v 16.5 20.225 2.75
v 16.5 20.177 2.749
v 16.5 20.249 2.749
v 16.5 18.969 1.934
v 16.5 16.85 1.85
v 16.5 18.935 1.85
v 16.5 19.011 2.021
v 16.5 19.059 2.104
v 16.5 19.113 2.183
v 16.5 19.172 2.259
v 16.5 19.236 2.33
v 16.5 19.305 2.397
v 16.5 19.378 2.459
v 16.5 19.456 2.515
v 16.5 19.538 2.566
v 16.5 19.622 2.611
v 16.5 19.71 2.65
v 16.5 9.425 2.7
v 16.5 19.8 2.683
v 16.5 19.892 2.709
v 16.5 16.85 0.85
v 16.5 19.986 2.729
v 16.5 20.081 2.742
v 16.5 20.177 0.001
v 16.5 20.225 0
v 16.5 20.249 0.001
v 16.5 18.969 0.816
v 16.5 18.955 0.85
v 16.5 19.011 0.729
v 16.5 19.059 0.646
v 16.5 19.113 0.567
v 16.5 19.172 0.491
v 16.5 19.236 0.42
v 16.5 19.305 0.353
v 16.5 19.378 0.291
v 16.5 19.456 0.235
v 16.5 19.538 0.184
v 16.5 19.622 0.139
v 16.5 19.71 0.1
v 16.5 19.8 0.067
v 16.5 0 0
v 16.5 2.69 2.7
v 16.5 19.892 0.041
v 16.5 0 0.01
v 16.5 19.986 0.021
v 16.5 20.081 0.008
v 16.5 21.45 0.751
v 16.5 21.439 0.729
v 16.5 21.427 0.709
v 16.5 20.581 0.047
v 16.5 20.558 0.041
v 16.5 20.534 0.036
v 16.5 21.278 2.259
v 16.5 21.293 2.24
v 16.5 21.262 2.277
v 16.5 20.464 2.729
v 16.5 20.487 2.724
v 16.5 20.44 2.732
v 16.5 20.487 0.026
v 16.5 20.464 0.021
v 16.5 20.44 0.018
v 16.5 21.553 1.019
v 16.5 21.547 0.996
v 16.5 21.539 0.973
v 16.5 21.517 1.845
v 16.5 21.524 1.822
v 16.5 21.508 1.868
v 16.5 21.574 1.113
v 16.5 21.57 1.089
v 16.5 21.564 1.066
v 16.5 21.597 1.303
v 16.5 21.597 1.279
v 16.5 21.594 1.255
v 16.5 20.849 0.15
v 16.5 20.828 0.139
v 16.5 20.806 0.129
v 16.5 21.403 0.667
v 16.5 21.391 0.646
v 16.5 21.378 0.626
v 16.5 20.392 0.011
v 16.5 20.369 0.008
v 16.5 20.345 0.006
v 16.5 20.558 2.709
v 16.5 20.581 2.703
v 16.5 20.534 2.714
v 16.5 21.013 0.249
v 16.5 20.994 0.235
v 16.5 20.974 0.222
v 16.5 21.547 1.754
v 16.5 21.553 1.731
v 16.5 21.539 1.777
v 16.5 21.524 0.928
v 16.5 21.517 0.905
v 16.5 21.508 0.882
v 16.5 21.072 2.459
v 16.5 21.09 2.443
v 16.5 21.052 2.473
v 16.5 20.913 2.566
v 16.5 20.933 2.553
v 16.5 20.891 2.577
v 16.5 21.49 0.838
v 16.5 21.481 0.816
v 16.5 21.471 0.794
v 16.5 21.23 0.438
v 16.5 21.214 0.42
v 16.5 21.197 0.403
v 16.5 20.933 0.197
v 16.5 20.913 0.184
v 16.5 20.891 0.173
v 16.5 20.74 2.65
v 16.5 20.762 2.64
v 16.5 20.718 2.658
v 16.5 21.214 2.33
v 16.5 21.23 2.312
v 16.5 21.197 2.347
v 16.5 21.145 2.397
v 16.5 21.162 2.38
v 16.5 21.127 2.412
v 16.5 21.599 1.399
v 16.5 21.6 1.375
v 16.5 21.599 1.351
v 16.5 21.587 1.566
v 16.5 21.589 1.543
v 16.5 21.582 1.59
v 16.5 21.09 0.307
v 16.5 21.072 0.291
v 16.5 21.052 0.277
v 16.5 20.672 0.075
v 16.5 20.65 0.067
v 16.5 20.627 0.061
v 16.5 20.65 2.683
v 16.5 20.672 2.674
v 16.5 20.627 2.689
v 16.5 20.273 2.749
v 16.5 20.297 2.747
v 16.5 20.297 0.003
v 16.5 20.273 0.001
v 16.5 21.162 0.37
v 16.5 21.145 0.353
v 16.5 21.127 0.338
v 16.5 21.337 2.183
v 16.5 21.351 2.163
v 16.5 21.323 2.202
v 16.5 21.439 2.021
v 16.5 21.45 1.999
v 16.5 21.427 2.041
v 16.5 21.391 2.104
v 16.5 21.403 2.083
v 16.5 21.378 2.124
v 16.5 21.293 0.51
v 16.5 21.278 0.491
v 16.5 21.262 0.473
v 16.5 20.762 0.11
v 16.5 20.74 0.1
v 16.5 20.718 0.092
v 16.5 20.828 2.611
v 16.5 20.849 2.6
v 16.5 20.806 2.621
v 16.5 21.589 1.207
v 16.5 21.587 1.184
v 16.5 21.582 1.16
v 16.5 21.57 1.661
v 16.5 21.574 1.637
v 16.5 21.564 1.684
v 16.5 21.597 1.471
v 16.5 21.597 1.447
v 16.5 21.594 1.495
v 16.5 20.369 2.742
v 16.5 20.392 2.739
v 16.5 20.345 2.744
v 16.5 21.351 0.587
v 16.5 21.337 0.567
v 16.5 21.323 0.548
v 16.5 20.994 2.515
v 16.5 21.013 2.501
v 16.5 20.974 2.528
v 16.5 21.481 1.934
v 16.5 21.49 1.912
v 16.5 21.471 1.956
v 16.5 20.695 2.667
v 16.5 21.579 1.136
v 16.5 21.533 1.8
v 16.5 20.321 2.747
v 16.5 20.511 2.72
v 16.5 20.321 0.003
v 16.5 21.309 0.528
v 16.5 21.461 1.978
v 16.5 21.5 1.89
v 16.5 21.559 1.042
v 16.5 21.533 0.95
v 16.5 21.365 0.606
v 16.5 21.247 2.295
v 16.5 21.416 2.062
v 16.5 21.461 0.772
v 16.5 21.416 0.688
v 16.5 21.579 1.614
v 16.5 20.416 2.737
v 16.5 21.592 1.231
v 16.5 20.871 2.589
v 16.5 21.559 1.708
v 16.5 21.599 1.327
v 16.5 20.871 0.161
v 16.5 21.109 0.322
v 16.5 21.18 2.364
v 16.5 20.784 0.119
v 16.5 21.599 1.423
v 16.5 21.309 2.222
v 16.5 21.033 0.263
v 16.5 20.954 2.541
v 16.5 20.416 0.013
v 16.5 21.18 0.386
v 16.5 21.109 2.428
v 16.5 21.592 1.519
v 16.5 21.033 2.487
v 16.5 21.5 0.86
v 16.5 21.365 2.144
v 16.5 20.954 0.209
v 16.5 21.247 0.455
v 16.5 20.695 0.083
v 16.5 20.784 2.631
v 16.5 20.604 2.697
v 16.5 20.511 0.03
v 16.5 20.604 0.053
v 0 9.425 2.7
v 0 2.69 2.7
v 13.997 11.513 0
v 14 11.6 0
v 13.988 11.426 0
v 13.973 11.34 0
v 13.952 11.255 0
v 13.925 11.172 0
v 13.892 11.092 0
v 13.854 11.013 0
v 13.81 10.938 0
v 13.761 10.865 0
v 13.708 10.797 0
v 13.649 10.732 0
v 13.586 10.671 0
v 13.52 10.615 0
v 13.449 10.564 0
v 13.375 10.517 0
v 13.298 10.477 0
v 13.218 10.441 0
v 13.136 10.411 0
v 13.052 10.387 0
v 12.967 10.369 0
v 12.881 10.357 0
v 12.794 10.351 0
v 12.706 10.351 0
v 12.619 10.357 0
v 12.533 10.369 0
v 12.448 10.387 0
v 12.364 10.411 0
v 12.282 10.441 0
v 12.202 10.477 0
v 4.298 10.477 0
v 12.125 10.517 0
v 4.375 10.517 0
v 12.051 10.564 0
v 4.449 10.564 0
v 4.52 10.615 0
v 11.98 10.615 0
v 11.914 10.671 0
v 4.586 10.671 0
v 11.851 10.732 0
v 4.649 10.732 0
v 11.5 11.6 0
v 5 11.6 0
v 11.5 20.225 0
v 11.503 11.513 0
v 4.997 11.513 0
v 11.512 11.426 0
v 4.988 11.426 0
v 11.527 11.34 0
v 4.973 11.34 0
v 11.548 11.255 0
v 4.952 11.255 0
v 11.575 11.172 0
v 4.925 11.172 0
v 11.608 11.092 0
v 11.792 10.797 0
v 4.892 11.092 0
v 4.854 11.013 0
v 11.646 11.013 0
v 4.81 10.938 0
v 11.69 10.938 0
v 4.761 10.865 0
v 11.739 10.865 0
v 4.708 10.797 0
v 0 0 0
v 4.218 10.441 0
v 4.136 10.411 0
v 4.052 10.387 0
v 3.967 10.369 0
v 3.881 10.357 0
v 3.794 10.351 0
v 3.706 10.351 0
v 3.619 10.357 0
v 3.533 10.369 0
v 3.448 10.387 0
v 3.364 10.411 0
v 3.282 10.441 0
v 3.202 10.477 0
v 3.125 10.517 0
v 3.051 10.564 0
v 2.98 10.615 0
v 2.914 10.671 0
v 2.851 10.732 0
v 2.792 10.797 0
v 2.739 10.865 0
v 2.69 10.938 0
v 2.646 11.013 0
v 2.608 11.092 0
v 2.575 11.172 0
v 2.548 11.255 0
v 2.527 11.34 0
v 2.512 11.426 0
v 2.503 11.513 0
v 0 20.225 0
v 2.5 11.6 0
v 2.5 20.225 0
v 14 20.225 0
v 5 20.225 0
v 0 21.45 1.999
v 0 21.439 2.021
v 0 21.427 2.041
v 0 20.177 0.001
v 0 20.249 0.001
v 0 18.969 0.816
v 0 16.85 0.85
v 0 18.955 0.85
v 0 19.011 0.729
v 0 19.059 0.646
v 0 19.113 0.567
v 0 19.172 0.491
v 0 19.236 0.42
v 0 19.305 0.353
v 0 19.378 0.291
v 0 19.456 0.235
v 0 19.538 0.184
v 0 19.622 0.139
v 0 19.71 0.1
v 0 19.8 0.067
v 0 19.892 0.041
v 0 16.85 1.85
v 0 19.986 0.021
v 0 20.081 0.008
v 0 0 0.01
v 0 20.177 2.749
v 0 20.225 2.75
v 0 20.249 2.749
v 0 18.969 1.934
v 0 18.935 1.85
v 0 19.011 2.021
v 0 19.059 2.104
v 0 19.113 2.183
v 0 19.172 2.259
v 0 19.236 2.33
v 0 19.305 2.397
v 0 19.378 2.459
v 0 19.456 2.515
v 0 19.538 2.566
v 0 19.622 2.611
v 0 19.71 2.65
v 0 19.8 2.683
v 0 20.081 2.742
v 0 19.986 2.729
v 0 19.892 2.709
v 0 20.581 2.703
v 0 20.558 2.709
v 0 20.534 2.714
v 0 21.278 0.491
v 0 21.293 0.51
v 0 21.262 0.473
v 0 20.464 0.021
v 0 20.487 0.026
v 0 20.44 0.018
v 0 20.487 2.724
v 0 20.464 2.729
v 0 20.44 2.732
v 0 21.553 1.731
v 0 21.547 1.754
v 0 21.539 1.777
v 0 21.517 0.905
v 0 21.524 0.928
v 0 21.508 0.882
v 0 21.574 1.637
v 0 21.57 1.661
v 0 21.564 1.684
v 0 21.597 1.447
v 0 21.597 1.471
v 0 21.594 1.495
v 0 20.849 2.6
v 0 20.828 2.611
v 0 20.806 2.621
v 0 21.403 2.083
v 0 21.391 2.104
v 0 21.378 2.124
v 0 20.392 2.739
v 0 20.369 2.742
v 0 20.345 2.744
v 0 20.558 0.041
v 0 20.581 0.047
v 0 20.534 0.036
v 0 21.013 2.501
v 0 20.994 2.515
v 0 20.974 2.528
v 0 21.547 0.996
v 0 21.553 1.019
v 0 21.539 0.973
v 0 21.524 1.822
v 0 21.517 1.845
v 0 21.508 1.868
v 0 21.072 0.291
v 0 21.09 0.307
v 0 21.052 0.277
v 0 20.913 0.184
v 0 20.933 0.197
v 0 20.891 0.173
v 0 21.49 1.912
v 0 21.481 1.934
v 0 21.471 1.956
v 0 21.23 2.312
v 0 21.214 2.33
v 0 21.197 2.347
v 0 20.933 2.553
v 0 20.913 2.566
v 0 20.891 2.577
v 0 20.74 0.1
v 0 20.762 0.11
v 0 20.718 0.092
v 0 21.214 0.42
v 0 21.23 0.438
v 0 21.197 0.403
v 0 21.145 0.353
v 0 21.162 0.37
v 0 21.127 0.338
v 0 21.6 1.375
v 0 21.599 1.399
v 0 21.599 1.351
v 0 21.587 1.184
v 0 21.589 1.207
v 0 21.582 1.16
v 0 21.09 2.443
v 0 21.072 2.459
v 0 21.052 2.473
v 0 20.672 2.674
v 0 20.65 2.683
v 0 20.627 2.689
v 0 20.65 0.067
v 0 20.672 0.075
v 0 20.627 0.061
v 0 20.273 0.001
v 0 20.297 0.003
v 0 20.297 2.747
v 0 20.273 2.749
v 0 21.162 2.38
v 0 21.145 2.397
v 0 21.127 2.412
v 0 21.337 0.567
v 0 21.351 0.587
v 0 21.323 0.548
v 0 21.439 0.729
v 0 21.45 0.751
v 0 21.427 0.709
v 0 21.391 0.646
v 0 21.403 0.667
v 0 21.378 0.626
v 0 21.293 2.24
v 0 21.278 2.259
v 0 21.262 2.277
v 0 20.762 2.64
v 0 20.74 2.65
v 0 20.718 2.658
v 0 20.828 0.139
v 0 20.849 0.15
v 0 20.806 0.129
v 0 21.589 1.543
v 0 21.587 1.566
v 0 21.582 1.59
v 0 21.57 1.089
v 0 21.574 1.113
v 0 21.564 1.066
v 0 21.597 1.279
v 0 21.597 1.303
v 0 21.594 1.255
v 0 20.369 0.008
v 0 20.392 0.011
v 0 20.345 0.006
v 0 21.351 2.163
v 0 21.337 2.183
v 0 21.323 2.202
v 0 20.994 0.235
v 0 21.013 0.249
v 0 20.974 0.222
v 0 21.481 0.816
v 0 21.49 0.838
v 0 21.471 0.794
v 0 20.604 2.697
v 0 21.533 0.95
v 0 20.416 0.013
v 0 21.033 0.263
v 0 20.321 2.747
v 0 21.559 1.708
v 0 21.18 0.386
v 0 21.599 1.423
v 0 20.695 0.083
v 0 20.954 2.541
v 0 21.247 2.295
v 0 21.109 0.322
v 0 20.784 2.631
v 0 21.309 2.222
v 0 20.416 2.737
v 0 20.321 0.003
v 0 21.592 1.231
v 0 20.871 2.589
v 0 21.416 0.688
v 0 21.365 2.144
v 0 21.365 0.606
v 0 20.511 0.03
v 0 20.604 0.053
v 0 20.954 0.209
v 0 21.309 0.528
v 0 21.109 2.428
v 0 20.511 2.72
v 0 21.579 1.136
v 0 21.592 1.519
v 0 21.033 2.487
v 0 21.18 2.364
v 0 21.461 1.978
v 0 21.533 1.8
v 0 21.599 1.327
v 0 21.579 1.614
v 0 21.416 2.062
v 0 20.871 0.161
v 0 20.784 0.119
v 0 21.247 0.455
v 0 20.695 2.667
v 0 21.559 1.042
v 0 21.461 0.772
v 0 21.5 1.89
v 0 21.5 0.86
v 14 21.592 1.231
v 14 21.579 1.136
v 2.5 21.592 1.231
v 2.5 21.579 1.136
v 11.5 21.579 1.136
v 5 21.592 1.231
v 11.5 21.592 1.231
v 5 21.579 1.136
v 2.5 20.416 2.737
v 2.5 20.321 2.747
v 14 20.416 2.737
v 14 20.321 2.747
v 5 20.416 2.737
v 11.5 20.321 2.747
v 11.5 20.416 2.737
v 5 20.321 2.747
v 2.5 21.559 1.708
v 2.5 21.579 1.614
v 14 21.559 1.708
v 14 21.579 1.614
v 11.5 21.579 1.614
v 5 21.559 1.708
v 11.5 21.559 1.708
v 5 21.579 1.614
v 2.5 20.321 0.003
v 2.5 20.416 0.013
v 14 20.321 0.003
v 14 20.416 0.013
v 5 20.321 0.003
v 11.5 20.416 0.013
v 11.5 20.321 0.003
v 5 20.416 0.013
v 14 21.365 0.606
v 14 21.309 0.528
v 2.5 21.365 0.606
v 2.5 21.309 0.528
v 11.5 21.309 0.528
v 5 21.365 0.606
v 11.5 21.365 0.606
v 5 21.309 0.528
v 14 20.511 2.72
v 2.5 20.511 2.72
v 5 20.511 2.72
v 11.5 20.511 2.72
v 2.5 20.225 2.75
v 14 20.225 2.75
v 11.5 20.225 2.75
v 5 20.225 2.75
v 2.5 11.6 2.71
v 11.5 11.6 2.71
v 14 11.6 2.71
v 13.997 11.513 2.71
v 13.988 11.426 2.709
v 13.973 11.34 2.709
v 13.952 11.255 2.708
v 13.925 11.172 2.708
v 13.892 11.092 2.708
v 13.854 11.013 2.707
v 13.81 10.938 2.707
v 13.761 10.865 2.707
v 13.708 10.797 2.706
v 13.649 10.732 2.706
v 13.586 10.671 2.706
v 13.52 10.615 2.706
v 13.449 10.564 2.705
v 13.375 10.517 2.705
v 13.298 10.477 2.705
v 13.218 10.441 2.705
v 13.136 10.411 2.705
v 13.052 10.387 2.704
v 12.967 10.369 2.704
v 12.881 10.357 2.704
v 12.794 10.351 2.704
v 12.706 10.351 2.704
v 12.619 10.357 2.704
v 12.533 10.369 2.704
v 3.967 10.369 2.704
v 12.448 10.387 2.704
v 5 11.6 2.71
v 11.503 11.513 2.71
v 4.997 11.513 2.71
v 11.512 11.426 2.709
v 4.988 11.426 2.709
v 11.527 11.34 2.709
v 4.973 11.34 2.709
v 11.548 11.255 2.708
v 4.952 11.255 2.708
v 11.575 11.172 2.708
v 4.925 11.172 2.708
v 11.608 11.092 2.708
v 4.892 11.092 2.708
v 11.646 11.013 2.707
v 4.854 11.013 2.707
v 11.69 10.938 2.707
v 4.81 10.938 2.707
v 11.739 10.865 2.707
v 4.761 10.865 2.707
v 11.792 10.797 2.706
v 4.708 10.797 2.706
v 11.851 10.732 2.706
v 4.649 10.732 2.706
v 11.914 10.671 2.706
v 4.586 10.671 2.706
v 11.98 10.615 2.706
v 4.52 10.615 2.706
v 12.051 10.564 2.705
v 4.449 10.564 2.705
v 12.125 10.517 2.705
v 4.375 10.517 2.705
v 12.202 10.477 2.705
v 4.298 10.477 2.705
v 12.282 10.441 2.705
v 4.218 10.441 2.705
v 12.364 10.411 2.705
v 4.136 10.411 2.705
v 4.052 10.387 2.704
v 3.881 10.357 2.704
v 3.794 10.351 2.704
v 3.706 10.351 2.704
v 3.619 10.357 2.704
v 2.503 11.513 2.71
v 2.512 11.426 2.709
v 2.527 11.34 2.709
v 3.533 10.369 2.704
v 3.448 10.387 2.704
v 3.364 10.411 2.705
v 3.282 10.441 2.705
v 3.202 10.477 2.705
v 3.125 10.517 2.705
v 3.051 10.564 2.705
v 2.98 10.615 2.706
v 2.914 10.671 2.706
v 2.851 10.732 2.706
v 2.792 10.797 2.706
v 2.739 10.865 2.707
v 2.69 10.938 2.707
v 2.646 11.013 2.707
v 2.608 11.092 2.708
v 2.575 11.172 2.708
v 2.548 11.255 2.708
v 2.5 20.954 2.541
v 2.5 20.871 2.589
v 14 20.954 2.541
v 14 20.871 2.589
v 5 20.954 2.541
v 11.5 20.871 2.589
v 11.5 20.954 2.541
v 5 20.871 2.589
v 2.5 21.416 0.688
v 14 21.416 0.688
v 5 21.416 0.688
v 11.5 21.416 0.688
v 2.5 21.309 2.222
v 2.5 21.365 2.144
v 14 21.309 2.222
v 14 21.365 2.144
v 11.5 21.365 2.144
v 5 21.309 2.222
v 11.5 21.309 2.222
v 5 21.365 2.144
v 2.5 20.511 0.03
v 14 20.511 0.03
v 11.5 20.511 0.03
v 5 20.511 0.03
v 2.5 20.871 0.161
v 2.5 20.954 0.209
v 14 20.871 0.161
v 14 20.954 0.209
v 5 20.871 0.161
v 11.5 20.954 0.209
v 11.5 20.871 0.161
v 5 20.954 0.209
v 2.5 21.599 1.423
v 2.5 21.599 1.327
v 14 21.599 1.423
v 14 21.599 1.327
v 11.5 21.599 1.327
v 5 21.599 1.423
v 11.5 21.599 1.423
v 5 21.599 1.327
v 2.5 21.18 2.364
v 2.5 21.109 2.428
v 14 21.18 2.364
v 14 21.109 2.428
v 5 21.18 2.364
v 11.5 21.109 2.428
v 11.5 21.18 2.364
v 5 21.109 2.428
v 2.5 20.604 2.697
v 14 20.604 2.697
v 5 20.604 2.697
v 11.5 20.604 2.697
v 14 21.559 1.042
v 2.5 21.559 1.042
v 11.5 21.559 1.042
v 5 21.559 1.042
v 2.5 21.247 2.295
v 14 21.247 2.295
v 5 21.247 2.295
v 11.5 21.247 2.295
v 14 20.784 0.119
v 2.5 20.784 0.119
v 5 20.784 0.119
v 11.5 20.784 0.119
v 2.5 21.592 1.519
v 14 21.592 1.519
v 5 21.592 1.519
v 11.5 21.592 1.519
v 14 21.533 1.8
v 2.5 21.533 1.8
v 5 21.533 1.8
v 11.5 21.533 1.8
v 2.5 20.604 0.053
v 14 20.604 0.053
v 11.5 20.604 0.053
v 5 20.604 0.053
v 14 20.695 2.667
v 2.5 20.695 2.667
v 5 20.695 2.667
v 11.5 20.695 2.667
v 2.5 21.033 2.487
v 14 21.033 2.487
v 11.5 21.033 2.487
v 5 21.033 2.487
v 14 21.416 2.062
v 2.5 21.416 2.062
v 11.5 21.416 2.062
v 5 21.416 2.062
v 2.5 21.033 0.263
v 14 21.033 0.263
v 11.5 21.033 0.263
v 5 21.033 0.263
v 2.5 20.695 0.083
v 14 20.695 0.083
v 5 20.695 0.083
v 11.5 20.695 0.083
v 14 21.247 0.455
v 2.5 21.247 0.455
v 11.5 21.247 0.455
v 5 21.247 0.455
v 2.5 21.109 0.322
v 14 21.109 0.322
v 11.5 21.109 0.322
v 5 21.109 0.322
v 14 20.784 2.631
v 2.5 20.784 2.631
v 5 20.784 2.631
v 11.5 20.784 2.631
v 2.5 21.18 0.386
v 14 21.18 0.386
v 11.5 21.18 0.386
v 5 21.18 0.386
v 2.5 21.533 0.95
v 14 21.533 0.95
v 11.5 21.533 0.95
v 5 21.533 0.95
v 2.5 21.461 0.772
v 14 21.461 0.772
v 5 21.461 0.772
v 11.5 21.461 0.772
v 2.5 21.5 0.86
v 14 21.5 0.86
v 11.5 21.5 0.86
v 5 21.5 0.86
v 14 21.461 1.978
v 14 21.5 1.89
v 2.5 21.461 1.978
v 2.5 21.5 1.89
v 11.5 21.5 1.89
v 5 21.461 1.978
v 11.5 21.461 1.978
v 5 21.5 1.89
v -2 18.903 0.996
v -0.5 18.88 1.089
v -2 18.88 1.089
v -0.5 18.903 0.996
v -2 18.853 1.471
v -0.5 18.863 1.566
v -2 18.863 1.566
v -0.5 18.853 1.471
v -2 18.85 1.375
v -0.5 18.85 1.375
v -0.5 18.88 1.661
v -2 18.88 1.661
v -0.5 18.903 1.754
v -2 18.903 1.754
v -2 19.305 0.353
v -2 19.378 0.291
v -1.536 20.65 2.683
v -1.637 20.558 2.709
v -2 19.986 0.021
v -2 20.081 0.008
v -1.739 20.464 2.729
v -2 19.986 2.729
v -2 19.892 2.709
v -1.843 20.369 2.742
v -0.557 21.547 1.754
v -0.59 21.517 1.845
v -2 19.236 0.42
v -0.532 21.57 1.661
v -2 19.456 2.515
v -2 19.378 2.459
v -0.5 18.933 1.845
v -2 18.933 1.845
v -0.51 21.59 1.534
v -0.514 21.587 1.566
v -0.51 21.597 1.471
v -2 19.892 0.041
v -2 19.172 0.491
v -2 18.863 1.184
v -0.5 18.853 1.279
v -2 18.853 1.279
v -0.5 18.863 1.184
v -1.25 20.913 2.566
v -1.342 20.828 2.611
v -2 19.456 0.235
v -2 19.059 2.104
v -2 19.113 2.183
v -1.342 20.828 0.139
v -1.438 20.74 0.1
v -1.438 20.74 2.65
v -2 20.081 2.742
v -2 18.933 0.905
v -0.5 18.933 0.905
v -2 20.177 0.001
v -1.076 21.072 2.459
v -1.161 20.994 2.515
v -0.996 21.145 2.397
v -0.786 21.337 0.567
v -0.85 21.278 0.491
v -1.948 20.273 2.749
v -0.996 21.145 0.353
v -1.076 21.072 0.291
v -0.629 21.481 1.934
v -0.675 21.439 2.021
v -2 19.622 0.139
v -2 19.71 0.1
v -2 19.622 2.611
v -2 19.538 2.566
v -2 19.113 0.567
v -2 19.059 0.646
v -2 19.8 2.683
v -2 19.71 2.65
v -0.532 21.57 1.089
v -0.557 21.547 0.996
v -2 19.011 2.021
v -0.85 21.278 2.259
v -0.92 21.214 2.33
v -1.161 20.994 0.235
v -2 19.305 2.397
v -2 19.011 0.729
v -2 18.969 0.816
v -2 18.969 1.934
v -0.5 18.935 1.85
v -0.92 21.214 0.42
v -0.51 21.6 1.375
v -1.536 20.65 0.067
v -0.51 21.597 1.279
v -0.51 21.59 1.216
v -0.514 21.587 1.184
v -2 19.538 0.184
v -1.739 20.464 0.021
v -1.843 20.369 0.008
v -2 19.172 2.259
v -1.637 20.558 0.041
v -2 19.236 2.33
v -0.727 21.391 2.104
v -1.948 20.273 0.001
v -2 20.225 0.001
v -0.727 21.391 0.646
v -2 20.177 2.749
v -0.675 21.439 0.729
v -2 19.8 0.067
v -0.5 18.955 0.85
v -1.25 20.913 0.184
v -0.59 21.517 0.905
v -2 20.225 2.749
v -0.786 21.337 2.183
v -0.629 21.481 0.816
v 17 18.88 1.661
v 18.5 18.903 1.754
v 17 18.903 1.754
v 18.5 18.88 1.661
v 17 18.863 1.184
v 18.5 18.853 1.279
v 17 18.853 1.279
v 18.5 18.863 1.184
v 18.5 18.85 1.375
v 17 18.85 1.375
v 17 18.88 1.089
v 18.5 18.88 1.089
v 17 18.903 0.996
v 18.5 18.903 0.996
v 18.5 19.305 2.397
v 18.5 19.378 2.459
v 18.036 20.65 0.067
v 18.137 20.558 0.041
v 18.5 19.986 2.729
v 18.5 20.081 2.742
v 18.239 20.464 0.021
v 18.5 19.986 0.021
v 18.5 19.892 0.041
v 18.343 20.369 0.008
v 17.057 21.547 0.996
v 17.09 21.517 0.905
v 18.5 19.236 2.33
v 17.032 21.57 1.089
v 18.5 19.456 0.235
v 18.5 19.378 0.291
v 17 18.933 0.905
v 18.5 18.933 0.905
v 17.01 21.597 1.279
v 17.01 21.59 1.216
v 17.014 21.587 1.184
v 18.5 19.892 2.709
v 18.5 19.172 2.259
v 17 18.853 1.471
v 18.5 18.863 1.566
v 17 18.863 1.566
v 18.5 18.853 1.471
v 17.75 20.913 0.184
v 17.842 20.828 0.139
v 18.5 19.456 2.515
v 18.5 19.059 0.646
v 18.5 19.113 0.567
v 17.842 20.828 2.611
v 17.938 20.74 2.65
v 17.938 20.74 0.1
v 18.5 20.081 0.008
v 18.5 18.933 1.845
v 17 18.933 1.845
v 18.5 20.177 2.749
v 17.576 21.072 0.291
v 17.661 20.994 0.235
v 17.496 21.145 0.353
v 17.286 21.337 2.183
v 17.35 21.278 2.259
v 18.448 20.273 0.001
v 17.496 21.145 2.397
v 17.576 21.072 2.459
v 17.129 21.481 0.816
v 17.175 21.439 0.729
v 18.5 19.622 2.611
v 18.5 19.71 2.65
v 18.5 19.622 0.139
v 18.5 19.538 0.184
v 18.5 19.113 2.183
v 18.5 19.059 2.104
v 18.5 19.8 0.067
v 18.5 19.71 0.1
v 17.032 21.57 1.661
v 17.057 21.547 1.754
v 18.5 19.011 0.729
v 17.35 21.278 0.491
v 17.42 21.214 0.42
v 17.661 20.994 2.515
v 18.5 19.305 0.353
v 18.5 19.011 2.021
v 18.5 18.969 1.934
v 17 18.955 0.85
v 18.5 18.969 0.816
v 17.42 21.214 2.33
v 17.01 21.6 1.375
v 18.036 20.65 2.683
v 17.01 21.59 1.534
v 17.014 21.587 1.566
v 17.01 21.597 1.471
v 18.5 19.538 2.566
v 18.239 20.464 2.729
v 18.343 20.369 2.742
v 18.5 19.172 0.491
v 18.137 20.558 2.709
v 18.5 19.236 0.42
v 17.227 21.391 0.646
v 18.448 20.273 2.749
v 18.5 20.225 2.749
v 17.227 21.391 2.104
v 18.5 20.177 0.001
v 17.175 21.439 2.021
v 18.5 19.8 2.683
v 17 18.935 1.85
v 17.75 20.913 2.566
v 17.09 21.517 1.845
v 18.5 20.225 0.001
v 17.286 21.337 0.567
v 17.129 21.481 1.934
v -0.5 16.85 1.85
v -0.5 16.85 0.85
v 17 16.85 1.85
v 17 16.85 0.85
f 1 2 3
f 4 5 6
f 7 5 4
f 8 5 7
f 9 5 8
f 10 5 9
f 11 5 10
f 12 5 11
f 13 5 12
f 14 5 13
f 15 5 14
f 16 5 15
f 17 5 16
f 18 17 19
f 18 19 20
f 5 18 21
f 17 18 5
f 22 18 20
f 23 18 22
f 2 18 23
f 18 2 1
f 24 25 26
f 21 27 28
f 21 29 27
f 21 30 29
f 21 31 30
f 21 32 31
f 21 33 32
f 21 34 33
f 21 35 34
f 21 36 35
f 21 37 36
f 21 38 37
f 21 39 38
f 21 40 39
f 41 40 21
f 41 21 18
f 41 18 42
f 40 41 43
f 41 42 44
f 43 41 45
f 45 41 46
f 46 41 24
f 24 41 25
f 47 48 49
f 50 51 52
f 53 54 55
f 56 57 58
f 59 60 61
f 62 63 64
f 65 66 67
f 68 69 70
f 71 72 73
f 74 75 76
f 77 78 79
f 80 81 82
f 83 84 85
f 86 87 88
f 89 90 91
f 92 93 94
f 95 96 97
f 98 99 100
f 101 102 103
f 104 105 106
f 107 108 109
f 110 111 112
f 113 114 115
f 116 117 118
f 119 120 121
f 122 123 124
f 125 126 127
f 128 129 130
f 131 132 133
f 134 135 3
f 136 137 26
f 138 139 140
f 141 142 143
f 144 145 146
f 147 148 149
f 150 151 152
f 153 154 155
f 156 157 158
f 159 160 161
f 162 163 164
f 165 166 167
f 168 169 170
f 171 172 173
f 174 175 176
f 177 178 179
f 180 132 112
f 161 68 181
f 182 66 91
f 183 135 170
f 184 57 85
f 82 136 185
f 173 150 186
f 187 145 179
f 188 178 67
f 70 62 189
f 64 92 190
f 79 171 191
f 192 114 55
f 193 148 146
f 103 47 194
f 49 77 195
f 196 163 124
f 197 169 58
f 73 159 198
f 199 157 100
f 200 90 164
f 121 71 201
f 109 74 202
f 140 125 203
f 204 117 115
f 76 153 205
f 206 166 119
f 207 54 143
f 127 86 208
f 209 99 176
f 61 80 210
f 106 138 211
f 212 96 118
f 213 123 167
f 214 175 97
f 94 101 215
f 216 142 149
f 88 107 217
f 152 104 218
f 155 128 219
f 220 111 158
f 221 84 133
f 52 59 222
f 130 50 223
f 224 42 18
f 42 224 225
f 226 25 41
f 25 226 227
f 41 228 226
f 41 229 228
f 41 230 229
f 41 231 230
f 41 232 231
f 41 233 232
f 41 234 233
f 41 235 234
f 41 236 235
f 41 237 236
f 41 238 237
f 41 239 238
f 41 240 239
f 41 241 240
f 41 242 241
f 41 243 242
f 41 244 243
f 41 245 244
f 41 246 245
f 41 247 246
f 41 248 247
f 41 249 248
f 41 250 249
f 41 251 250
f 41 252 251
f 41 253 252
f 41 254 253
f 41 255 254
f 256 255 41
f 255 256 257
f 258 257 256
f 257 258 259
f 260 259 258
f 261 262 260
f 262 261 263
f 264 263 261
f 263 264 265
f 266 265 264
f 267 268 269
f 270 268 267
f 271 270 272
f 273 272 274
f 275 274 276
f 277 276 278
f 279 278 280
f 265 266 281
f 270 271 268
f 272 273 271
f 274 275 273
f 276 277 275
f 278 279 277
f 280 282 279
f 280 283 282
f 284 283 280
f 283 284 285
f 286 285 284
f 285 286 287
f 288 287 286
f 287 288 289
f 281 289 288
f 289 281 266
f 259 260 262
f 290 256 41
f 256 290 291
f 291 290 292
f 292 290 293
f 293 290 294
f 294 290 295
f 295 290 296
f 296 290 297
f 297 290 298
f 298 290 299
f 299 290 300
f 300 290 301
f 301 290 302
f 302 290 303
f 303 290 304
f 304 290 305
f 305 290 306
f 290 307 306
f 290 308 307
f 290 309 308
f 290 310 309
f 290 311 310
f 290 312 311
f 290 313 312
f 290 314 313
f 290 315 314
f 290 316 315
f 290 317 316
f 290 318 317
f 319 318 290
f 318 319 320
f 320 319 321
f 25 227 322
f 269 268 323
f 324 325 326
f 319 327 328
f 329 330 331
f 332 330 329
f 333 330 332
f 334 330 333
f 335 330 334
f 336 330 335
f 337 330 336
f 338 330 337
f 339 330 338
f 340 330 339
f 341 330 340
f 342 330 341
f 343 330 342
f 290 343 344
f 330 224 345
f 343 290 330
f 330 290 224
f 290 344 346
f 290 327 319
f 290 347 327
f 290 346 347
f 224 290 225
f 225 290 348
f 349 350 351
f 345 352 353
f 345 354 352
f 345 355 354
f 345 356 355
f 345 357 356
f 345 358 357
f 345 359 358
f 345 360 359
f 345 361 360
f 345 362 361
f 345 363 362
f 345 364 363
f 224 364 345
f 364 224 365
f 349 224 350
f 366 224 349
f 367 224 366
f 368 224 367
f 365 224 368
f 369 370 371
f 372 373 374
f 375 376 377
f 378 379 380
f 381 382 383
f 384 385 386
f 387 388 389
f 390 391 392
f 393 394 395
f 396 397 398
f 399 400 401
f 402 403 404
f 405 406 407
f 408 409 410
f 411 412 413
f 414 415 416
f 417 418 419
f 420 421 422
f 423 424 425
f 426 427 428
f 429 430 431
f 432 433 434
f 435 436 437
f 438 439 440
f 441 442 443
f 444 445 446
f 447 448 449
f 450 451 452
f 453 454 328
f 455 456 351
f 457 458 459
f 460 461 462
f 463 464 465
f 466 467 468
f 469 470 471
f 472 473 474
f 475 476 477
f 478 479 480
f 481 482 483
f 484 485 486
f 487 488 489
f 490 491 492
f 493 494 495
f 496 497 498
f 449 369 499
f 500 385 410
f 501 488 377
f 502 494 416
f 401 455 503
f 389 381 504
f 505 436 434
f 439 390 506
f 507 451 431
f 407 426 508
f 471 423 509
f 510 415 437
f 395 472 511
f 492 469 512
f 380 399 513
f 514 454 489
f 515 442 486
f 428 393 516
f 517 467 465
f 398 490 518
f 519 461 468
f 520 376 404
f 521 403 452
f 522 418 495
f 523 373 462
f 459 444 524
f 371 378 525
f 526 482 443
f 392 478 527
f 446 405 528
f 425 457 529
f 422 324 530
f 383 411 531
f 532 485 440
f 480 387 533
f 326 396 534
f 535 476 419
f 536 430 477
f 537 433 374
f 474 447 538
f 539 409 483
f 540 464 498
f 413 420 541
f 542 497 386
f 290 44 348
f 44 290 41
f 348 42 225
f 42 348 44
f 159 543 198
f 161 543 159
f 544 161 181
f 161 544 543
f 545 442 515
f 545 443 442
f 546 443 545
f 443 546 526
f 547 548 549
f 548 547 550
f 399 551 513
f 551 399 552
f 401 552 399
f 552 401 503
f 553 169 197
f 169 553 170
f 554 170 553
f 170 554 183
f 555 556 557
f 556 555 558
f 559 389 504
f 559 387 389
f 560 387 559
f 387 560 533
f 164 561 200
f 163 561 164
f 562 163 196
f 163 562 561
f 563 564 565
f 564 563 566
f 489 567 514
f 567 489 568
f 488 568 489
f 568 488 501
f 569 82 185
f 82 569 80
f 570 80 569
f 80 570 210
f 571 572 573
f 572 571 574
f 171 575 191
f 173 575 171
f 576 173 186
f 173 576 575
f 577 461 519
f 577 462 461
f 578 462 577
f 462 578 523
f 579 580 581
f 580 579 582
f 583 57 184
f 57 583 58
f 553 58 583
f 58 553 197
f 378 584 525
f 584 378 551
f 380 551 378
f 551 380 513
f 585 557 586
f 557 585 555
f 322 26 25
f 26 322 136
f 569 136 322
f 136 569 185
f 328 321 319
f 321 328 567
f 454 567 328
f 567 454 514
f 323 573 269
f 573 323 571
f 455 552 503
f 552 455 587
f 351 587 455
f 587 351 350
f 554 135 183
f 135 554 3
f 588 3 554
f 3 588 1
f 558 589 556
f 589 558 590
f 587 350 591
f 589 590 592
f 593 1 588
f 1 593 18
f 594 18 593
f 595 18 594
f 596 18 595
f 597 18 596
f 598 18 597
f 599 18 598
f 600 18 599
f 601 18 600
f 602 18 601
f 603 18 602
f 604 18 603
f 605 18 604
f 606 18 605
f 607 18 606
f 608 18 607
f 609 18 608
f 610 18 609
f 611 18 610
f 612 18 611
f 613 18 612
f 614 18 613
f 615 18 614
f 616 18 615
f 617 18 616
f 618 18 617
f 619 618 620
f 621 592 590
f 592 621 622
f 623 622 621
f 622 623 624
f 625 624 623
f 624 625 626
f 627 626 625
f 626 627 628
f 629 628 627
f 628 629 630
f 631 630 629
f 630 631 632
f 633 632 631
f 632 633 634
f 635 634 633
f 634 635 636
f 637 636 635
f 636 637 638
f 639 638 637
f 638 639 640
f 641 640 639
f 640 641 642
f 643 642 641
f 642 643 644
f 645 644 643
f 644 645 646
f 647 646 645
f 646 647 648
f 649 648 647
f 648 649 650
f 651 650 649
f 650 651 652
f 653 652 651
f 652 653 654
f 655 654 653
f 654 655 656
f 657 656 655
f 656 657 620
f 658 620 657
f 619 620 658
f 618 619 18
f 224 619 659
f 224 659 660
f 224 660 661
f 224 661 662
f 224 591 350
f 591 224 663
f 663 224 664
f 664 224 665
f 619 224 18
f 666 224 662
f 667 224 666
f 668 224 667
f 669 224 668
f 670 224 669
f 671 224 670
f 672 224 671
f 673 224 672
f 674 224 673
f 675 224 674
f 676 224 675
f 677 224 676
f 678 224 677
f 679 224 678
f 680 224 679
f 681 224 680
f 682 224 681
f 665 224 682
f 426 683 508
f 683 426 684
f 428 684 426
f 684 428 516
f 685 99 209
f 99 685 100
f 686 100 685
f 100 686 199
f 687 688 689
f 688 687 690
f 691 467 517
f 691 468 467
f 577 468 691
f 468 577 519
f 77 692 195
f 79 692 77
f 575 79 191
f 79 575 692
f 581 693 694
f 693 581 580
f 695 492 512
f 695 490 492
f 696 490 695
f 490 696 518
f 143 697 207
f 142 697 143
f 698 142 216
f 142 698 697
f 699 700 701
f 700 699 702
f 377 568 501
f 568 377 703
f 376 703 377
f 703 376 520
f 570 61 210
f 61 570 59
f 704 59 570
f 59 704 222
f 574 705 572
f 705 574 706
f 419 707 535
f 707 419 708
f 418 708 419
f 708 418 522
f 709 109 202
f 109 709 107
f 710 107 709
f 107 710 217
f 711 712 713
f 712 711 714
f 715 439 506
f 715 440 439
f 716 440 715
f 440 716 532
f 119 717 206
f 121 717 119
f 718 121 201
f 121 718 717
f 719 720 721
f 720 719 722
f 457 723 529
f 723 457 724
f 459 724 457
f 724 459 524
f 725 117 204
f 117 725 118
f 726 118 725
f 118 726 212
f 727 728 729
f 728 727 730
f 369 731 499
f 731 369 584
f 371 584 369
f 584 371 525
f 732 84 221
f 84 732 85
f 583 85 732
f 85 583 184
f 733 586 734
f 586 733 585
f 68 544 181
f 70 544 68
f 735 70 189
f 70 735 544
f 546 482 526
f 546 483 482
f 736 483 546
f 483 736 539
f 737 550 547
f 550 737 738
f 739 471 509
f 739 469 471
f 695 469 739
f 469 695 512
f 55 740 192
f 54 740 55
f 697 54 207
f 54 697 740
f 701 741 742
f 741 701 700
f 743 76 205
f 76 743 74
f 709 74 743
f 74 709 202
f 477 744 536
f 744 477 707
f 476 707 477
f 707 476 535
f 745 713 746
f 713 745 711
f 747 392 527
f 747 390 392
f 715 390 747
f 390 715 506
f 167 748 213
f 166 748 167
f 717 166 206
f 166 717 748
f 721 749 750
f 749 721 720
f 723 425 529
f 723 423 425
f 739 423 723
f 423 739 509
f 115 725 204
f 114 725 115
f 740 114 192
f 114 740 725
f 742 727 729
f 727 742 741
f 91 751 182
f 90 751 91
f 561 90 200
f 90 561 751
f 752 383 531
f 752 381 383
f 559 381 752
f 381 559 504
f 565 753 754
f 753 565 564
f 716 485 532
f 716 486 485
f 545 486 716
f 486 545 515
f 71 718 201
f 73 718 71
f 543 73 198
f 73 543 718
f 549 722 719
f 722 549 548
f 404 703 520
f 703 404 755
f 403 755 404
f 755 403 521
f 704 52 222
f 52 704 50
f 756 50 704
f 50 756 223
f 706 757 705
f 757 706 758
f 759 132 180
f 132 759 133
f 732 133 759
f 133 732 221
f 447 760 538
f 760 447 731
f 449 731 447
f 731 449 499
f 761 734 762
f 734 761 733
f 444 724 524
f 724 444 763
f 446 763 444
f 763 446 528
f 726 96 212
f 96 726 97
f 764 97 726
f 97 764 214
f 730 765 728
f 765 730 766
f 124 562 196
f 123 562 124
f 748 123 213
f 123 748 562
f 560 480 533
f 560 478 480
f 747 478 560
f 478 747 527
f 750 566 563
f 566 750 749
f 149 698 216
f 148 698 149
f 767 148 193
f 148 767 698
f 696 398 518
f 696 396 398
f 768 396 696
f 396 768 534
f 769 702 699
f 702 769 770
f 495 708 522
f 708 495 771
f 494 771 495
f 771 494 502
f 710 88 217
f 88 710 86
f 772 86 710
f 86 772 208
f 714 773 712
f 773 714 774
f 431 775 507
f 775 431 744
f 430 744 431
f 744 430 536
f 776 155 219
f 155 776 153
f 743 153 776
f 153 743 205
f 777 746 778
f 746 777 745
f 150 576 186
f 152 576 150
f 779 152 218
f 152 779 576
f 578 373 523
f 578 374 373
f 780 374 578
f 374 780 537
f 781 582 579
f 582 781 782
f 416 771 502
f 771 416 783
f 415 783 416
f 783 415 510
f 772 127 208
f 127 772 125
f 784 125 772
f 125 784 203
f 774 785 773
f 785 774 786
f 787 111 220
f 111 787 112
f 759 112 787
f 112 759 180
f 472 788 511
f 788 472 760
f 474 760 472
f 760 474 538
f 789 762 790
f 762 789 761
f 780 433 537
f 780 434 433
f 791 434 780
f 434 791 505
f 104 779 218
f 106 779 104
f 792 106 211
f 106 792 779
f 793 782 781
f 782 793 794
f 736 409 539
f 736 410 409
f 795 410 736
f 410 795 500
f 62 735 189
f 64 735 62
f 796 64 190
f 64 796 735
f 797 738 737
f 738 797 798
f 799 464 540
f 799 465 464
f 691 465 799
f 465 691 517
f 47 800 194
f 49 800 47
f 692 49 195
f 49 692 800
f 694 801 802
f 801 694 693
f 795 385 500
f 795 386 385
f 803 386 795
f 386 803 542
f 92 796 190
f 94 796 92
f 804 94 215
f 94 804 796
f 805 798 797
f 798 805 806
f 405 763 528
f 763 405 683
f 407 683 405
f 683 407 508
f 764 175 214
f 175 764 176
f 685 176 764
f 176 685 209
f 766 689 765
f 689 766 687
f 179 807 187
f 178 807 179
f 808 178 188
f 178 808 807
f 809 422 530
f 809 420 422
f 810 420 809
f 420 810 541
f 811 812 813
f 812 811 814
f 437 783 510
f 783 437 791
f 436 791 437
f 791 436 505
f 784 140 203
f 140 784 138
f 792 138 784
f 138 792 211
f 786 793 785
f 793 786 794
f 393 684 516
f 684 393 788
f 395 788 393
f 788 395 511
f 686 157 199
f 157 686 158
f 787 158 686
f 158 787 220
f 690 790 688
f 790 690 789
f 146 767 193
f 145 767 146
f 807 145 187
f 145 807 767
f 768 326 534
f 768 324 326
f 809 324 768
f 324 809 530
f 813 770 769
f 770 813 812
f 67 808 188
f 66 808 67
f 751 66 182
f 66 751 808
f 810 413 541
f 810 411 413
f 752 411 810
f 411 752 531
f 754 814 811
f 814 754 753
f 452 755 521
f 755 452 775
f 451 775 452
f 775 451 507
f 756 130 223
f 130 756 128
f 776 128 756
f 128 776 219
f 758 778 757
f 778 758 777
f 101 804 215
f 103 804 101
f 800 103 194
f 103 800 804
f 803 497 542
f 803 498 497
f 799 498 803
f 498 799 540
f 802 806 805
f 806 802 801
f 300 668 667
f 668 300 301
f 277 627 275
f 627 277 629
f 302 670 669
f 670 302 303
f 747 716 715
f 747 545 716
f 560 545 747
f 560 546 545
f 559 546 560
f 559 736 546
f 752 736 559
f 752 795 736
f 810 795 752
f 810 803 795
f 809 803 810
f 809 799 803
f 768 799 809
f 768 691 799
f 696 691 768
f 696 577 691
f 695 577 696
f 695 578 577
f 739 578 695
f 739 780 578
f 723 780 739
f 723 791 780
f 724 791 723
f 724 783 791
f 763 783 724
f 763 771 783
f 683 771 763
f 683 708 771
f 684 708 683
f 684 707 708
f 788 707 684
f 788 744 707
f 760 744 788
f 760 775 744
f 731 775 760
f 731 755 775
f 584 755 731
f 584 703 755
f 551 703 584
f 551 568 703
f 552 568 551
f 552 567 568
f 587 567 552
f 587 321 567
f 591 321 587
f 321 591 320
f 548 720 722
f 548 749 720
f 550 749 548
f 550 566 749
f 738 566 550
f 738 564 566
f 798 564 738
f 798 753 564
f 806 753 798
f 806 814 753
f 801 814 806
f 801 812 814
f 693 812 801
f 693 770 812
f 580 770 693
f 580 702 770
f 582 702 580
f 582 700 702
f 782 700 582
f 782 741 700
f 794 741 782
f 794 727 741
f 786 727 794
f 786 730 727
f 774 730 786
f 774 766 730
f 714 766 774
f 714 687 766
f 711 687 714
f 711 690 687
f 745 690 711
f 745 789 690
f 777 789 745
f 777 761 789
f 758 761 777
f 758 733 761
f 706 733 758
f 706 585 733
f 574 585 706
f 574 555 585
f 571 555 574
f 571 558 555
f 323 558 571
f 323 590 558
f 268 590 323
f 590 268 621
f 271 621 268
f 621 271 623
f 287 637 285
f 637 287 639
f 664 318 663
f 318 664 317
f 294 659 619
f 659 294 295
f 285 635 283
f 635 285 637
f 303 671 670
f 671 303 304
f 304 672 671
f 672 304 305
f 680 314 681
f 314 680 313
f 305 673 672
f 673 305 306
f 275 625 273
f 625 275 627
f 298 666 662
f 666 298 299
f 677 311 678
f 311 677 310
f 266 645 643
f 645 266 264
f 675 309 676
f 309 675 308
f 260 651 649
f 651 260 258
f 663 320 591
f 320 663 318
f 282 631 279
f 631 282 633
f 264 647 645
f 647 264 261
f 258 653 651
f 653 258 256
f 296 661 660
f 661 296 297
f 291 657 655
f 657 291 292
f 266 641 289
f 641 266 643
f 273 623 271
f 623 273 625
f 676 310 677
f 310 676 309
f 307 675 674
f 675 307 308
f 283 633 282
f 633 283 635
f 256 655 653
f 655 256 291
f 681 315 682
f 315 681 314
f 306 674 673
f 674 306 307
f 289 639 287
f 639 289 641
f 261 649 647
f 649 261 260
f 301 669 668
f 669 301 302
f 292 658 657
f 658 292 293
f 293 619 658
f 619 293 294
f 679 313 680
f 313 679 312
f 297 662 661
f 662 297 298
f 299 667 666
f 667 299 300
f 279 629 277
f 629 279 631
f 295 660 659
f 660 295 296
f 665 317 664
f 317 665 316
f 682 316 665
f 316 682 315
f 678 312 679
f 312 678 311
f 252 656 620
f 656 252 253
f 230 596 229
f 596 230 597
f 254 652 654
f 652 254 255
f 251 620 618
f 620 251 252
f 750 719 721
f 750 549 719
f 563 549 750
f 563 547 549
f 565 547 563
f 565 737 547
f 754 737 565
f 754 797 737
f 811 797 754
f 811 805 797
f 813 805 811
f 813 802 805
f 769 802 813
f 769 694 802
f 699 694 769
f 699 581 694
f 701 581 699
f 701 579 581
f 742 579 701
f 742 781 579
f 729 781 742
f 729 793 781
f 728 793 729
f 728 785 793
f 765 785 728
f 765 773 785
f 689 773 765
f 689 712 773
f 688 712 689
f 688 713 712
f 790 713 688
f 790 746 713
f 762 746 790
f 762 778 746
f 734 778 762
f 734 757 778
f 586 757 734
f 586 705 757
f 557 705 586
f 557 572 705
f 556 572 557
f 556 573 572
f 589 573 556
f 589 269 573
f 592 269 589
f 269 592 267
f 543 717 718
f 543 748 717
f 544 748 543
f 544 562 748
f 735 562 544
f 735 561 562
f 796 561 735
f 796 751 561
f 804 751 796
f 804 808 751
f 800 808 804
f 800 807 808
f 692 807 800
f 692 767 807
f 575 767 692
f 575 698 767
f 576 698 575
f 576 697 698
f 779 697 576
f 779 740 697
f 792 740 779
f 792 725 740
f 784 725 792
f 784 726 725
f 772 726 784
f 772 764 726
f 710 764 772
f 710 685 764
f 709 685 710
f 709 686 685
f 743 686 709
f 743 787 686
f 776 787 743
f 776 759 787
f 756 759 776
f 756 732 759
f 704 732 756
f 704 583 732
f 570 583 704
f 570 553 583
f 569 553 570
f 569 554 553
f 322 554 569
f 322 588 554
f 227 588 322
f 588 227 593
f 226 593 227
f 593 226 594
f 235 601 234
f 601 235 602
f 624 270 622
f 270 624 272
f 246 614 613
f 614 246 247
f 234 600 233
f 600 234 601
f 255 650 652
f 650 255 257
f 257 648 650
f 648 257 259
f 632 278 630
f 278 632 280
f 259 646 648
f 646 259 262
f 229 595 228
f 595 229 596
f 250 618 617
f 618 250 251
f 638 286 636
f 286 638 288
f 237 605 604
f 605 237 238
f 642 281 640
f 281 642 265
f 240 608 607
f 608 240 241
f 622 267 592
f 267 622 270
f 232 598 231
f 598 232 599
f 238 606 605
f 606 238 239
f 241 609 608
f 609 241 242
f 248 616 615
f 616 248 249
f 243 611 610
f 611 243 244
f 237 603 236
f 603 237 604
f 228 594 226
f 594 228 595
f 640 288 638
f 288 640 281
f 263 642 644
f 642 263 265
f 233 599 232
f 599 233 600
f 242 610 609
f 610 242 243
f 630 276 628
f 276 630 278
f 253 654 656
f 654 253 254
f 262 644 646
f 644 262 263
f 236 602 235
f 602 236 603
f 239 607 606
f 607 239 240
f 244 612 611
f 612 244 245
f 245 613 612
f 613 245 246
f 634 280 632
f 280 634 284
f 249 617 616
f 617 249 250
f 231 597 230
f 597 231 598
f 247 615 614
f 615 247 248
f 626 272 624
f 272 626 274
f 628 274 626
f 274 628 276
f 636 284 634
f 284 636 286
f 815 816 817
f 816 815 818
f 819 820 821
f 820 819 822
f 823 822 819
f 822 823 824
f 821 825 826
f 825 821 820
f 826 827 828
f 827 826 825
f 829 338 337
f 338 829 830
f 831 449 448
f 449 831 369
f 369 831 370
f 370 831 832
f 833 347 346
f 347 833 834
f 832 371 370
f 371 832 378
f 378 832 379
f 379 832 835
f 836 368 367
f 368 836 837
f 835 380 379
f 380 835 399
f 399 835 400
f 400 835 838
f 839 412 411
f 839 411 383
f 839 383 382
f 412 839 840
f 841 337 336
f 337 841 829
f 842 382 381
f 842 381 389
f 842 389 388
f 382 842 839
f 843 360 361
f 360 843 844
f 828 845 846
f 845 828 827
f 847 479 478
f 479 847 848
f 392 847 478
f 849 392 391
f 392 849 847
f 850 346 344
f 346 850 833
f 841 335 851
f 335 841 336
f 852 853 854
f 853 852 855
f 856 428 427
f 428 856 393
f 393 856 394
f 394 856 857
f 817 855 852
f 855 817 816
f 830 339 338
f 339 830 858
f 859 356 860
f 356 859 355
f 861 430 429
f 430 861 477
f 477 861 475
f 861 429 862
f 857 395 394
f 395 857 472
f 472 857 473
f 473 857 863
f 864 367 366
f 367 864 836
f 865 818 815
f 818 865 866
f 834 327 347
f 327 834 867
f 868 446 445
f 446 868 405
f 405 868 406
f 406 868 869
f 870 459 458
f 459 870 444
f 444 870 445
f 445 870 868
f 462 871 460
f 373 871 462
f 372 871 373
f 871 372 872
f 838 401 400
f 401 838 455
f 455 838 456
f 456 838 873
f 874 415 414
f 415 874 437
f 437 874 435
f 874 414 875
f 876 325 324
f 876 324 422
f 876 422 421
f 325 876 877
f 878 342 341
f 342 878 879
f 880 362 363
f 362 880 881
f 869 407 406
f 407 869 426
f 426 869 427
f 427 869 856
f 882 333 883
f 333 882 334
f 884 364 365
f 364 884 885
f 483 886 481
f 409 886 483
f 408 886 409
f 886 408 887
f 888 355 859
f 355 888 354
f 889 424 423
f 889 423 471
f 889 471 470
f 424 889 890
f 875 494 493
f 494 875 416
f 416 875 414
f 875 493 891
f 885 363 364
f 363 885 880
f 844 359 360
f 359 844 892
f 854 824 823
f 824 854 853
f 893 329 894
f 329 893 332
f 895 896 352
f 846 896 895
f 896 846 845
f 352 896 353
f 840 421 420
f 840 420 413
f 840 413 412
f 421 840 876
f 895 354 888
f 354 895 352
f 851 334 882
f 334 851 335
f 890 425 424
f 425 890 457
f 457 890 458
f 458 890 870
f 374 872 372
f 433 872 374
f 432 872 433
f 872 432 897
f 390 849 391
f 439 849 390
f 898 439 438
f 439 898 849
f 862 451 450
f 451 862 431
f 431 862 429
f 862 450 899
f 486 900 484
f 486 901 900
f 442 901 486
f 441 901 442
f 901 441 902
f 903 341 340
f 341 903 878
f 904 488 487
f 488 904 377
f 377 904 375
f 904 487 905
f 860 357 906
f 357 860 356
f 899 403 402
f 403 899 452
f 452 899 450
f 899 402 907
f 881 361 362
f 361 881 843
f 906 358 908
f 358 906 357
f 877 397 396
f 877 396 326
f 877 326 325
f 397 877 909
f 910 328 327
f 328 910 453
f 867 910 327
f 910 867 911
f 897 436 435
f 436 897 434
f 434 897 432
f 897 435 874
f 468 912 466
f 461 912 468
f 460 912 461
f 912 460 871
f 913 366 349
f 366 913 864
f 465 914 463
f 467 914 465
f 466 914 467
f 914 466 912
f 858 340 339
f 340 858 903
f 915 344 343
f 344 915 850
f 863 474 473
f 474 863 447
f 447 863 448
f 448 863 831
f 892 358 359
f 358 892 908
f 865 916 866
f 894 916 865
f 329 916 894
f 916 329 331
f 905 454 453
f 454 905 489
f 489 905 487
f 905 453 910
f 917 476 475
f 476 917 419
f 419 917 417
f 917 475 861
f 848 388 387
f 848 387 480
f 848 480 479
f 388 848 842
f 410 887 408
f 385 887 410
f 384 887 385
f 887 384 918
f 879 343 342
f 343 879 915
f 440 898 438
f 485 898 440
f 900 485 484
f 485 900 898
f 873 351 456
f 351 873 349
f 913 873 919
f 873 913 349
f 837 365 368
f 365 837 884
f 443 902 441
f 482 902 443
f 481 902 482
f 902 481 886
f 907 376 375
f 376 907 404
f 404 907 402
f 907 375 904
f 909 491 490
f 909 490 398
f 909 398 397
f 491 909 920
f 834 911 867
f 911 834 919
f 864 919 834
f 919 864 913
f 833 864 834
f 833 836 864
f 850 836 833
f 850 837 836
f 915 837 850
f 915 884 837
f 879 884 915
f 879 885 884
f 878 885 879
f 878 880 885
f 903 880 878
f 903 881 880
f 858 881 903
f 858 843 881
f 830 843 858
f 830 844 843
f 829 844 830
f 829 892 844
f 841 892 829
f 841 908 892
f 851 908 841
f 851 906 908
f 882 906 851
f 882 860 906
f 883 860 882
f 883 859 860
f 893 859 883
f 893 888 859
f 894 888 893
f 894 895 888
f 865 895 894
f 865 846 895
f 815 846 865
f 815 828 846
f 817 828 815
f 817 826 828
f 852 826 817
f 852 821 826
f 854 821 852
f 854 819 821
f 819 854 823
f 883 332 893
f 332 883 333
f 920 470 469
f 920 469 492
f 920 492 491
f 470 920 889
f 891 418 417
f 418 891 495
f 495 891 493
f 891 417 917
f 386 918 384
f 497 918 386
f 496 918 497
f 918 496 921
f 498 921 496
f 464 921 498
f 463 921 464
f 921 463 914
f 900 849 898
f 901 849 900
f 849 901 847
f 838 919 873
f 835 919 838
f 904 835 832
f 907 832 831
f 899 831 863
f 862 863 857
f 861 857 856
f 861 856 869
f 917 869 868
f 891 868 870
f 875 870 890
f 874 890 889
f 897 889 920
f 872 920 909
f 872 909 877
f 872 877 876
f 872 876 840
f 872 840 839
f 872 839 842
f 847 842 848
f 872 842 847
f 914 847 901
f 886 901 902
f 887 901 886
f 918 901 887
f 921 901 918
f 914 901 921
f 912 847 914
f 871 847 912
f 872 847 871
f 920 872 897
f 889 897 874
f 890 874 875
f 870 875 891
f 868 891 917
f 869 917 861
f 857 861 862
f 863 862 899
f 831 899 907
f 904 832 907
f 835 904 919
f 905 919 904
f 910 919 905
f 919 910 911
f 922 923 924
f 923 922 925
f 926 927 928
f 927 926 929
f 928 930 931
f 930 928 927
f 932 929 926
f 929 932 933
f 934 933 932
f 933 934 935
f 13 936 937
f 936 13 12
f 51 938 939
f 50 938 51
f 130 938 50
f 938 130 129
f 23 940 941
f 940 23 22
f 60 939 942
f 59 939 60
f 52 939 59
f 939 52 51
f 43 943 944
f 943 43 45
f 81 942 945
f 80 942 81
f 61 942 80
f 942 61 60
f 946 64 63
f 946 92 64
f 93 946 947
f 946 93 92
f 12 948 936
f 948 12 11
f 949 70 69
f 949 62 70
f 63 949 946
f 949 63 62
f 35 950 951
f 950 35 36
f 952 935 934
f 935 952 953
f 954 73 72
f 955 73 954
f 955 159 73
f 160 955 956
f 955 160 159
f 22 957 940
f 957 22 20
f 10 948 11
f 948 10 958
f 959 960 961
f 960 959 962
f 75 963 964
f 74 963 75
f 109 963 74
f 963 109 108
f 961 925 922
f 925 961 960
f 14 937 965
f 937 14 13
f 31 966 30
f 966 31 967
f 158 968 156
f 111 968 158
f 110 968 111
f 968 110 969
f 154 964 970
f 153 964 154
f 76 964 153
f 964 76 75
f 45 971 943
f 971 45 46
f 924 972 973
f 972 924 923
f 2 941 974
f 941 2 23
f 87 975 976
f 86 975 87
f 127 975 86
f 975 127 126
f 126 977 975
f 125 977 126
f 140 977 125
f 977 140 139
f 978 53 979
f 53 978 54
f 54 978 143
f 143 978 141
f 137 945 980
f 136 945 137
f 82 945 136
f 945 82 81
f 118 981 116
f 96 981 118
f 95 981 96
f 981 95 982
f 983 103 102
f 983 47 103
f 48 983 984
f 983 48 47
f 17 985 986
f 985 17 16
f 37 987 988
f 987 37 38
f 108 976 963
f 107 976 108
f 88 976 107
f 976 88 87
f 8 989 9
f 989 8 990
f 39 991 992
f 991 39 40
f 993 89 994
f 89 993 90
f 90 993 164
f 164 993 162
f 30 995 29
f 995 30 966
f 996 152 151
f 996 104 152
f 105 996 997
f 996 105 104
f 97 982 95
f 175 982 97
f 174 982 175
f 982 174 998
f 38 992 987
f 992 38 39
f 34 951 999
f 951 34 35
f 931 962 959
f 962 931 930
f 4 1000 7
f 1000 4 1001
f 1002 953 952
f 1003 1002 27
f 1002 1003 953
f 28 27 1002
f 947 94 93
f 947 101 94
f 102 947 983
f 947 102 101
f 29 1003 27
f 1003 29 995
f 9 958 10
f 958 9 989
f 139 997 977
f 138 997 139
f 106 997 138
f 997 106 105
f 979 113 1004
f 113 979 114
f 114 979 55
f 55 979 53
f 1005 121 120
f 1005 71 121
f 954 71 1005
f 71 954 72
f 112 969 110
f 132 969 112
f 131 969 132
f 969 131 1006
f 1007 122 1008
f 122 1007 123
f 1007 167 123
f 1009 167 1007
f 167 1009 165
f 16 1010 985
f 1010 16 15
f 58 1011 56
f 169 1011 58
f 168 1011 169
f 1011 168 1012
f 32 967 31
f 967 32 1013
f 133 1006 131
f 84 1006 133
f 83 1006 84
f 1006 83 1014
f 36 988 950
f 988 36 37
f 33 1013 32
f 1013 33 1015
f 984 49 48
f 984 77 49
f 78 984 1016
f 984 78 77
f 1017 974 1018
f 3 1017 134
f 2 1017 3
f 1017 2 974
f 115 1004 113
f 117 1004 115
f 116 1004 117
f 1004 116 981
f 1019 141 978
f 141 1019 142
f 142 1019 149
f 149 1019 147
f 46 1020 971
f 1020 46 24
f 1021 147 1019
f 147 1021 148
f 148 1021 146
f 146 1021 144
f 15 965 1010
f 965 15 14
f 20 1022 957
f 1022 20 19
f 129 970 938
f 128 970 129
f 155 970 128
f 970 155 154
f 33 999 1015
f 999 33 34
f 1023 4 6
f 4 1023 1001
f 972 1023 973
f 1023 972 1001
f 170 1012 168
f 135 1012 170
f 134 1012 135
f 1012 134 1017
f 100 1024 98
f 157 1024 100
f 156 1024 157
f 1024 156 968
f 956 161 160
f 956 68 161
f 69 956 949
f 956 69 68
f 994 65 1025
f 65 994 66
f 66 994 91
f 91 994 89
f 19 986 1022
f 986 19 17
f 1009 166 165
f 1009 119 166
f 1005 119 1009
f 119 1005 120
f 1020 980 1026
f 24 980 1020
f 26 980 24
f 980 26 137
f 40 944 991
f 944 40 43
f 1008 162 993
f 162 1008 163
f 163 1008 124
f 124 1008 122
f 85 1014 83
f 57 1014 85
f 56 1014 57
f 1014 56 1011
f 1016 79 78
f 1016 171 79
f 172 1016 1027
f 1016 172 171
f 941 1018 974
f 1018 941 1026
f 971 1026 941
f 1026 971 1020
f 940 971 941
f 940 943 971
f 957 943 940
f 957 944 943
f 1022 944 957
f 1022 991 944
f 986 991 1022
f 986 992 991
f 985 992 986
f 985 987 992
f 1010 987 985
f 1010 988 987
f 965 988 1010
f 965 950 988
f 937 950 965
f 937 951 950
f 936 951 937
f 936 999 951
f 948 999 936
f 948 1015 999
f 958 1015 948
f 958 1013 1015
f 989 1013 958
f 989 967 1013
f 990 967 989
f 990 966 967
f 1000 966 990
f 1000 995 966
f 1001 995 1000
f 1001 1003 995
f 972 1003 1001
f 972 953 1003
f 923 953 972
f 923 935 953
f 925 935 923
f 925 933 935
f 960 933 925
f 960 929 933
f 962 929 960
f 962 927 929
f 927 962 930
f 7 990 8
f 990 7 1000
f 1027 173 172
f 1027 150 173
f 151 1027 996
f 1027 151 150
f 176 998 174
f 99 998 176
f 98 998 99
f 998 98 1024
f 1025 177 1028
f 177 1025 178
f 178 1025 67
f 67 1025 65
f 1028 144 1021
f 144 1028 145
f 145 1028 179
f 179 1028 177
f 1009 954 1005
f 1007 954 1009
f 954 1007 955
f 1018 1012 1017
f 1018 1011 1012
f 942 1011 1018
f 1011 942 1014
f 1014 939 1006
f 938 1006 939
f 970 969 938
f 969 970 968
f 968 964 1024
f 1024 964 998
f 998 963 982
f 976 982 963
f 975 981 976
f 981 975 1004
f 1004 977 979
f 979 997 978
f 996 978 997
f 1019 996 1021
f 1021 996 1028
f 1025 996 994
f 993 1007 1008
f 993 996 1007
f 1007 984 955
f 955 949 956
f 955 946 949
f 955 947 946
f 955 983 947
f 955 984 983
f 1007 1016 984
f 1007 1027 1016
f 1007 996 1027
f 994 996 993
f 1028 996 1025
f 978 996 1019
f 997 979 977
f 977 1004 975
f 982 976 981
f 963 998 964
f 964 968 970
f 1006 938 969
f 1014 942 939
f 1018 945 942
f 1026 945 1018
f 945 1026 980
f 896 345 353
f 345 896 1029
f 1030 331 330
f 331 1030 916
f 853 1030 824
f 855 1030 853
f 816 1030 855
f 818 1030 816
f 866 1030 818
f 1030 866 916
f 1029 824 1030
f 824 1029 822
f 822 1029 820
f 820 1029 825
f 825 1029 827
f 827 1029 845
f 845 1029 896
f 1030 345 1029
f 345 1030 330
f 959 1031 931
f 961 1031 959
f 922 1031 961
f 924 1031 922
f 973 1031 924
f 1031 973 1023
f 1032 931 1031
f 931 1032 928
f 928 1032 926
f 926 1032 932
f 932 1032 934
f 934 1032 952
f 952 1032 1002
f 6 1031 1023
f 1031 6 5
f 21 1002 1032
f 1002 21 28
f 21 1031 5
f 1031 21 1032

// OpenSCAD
// general purpose parameters
eps = 0.01;
$fn = 90;


// main shape parameters
/*
kl_d = 5.8;
kl_x = 20;
kl_y = 22.5;
kl_t = 2;
*/
kl_d = 2.75;
kl_x = 16.5;
kl_y = 21.6;
kl_t = 2.7;

// cut parameters
// cut width
c_w = 2.5;
// cut lenfth
c_l = 10;

// hinge parameters
/*
h_h = 3;
h_d = 2.3;
*/
h_h = 2;
h_d = 2.75;

// lock parameters
l_z = 1;
l_y = 2;
l_x = 0.5;

module cut()
{
    hull()
    {
        cylinder(h=kl_d+2*eps,d=c_w);
        translate([0,c_l,0])
            cylinder(h=kl_d+2*eps,d=c_w);
    }
}
    

module hinge()
{
    difference()
    {
        cylinder(d=h_d,h=h_h);
        translate([-h_d/2,-h_d/2,h_h/4+eps])
        hull()
        {
            cube([eps,h_d,3*h_h/4]);
            translate([0,0,3*h_h/4-eps])
                cube([h_d/2,h_d,eps]);
        }
    }
}


module keyboard_leg()
{
    difference()
    {
        union()
        {
            // main shape
            translate([0,kl_t,0])
                cube([kl_x,kl_y-kl_t-kl_d/2,kl_t]);
            // front slope
            hull()
            {
                cube([kl_x,kl_t,eps]);
                translate([0,kl_t-eps,0])
                    cube([kl_x,eps,kl_t]);
            }
            // back area
            hull()
            {
                translate([0,kl_y-kl_d/2,kl_d/2])
                    rotate([0,90,0])
                        cylinder(d=kl_d,h=kl_x);
                translate([0,kl_y/2-kl_d/2,0])
                    cube([kl_x,kl_y/2-kl_d/2,kl_t]);
            }
        }
        
        // springing cut
        translate([1.5*c_w,kl_y-c_l,-eps])
            cut();
        translate([kl_x-1.5*c_w,kl_y-c_l,-eps])
            cut();
            
    }
    // adding side cylinders
    translate([0,kl_y-kl_d/2,kl_d/2])
        rotate([90,0,-90])
            hinge();
    
    translate([kl_x,kl_y-kl_d/2,kl_d/2])
        rotate([-90,0,-90])
            hinge();
    
    // adding obscure locks to the hinges
    translate([-l_x,kl_y-h_d-l_y,kl_t/2-l_z/2])
        cube([l_x,l_y+h_d/2,l_z]);
    
    translate([kl_x,kl_y-h_d-l_y,kl_t/2-l_z/2])
        cube([l_x,l_y+h_d/2,l_z]);
    
    

    
}

keyboard_leg();
